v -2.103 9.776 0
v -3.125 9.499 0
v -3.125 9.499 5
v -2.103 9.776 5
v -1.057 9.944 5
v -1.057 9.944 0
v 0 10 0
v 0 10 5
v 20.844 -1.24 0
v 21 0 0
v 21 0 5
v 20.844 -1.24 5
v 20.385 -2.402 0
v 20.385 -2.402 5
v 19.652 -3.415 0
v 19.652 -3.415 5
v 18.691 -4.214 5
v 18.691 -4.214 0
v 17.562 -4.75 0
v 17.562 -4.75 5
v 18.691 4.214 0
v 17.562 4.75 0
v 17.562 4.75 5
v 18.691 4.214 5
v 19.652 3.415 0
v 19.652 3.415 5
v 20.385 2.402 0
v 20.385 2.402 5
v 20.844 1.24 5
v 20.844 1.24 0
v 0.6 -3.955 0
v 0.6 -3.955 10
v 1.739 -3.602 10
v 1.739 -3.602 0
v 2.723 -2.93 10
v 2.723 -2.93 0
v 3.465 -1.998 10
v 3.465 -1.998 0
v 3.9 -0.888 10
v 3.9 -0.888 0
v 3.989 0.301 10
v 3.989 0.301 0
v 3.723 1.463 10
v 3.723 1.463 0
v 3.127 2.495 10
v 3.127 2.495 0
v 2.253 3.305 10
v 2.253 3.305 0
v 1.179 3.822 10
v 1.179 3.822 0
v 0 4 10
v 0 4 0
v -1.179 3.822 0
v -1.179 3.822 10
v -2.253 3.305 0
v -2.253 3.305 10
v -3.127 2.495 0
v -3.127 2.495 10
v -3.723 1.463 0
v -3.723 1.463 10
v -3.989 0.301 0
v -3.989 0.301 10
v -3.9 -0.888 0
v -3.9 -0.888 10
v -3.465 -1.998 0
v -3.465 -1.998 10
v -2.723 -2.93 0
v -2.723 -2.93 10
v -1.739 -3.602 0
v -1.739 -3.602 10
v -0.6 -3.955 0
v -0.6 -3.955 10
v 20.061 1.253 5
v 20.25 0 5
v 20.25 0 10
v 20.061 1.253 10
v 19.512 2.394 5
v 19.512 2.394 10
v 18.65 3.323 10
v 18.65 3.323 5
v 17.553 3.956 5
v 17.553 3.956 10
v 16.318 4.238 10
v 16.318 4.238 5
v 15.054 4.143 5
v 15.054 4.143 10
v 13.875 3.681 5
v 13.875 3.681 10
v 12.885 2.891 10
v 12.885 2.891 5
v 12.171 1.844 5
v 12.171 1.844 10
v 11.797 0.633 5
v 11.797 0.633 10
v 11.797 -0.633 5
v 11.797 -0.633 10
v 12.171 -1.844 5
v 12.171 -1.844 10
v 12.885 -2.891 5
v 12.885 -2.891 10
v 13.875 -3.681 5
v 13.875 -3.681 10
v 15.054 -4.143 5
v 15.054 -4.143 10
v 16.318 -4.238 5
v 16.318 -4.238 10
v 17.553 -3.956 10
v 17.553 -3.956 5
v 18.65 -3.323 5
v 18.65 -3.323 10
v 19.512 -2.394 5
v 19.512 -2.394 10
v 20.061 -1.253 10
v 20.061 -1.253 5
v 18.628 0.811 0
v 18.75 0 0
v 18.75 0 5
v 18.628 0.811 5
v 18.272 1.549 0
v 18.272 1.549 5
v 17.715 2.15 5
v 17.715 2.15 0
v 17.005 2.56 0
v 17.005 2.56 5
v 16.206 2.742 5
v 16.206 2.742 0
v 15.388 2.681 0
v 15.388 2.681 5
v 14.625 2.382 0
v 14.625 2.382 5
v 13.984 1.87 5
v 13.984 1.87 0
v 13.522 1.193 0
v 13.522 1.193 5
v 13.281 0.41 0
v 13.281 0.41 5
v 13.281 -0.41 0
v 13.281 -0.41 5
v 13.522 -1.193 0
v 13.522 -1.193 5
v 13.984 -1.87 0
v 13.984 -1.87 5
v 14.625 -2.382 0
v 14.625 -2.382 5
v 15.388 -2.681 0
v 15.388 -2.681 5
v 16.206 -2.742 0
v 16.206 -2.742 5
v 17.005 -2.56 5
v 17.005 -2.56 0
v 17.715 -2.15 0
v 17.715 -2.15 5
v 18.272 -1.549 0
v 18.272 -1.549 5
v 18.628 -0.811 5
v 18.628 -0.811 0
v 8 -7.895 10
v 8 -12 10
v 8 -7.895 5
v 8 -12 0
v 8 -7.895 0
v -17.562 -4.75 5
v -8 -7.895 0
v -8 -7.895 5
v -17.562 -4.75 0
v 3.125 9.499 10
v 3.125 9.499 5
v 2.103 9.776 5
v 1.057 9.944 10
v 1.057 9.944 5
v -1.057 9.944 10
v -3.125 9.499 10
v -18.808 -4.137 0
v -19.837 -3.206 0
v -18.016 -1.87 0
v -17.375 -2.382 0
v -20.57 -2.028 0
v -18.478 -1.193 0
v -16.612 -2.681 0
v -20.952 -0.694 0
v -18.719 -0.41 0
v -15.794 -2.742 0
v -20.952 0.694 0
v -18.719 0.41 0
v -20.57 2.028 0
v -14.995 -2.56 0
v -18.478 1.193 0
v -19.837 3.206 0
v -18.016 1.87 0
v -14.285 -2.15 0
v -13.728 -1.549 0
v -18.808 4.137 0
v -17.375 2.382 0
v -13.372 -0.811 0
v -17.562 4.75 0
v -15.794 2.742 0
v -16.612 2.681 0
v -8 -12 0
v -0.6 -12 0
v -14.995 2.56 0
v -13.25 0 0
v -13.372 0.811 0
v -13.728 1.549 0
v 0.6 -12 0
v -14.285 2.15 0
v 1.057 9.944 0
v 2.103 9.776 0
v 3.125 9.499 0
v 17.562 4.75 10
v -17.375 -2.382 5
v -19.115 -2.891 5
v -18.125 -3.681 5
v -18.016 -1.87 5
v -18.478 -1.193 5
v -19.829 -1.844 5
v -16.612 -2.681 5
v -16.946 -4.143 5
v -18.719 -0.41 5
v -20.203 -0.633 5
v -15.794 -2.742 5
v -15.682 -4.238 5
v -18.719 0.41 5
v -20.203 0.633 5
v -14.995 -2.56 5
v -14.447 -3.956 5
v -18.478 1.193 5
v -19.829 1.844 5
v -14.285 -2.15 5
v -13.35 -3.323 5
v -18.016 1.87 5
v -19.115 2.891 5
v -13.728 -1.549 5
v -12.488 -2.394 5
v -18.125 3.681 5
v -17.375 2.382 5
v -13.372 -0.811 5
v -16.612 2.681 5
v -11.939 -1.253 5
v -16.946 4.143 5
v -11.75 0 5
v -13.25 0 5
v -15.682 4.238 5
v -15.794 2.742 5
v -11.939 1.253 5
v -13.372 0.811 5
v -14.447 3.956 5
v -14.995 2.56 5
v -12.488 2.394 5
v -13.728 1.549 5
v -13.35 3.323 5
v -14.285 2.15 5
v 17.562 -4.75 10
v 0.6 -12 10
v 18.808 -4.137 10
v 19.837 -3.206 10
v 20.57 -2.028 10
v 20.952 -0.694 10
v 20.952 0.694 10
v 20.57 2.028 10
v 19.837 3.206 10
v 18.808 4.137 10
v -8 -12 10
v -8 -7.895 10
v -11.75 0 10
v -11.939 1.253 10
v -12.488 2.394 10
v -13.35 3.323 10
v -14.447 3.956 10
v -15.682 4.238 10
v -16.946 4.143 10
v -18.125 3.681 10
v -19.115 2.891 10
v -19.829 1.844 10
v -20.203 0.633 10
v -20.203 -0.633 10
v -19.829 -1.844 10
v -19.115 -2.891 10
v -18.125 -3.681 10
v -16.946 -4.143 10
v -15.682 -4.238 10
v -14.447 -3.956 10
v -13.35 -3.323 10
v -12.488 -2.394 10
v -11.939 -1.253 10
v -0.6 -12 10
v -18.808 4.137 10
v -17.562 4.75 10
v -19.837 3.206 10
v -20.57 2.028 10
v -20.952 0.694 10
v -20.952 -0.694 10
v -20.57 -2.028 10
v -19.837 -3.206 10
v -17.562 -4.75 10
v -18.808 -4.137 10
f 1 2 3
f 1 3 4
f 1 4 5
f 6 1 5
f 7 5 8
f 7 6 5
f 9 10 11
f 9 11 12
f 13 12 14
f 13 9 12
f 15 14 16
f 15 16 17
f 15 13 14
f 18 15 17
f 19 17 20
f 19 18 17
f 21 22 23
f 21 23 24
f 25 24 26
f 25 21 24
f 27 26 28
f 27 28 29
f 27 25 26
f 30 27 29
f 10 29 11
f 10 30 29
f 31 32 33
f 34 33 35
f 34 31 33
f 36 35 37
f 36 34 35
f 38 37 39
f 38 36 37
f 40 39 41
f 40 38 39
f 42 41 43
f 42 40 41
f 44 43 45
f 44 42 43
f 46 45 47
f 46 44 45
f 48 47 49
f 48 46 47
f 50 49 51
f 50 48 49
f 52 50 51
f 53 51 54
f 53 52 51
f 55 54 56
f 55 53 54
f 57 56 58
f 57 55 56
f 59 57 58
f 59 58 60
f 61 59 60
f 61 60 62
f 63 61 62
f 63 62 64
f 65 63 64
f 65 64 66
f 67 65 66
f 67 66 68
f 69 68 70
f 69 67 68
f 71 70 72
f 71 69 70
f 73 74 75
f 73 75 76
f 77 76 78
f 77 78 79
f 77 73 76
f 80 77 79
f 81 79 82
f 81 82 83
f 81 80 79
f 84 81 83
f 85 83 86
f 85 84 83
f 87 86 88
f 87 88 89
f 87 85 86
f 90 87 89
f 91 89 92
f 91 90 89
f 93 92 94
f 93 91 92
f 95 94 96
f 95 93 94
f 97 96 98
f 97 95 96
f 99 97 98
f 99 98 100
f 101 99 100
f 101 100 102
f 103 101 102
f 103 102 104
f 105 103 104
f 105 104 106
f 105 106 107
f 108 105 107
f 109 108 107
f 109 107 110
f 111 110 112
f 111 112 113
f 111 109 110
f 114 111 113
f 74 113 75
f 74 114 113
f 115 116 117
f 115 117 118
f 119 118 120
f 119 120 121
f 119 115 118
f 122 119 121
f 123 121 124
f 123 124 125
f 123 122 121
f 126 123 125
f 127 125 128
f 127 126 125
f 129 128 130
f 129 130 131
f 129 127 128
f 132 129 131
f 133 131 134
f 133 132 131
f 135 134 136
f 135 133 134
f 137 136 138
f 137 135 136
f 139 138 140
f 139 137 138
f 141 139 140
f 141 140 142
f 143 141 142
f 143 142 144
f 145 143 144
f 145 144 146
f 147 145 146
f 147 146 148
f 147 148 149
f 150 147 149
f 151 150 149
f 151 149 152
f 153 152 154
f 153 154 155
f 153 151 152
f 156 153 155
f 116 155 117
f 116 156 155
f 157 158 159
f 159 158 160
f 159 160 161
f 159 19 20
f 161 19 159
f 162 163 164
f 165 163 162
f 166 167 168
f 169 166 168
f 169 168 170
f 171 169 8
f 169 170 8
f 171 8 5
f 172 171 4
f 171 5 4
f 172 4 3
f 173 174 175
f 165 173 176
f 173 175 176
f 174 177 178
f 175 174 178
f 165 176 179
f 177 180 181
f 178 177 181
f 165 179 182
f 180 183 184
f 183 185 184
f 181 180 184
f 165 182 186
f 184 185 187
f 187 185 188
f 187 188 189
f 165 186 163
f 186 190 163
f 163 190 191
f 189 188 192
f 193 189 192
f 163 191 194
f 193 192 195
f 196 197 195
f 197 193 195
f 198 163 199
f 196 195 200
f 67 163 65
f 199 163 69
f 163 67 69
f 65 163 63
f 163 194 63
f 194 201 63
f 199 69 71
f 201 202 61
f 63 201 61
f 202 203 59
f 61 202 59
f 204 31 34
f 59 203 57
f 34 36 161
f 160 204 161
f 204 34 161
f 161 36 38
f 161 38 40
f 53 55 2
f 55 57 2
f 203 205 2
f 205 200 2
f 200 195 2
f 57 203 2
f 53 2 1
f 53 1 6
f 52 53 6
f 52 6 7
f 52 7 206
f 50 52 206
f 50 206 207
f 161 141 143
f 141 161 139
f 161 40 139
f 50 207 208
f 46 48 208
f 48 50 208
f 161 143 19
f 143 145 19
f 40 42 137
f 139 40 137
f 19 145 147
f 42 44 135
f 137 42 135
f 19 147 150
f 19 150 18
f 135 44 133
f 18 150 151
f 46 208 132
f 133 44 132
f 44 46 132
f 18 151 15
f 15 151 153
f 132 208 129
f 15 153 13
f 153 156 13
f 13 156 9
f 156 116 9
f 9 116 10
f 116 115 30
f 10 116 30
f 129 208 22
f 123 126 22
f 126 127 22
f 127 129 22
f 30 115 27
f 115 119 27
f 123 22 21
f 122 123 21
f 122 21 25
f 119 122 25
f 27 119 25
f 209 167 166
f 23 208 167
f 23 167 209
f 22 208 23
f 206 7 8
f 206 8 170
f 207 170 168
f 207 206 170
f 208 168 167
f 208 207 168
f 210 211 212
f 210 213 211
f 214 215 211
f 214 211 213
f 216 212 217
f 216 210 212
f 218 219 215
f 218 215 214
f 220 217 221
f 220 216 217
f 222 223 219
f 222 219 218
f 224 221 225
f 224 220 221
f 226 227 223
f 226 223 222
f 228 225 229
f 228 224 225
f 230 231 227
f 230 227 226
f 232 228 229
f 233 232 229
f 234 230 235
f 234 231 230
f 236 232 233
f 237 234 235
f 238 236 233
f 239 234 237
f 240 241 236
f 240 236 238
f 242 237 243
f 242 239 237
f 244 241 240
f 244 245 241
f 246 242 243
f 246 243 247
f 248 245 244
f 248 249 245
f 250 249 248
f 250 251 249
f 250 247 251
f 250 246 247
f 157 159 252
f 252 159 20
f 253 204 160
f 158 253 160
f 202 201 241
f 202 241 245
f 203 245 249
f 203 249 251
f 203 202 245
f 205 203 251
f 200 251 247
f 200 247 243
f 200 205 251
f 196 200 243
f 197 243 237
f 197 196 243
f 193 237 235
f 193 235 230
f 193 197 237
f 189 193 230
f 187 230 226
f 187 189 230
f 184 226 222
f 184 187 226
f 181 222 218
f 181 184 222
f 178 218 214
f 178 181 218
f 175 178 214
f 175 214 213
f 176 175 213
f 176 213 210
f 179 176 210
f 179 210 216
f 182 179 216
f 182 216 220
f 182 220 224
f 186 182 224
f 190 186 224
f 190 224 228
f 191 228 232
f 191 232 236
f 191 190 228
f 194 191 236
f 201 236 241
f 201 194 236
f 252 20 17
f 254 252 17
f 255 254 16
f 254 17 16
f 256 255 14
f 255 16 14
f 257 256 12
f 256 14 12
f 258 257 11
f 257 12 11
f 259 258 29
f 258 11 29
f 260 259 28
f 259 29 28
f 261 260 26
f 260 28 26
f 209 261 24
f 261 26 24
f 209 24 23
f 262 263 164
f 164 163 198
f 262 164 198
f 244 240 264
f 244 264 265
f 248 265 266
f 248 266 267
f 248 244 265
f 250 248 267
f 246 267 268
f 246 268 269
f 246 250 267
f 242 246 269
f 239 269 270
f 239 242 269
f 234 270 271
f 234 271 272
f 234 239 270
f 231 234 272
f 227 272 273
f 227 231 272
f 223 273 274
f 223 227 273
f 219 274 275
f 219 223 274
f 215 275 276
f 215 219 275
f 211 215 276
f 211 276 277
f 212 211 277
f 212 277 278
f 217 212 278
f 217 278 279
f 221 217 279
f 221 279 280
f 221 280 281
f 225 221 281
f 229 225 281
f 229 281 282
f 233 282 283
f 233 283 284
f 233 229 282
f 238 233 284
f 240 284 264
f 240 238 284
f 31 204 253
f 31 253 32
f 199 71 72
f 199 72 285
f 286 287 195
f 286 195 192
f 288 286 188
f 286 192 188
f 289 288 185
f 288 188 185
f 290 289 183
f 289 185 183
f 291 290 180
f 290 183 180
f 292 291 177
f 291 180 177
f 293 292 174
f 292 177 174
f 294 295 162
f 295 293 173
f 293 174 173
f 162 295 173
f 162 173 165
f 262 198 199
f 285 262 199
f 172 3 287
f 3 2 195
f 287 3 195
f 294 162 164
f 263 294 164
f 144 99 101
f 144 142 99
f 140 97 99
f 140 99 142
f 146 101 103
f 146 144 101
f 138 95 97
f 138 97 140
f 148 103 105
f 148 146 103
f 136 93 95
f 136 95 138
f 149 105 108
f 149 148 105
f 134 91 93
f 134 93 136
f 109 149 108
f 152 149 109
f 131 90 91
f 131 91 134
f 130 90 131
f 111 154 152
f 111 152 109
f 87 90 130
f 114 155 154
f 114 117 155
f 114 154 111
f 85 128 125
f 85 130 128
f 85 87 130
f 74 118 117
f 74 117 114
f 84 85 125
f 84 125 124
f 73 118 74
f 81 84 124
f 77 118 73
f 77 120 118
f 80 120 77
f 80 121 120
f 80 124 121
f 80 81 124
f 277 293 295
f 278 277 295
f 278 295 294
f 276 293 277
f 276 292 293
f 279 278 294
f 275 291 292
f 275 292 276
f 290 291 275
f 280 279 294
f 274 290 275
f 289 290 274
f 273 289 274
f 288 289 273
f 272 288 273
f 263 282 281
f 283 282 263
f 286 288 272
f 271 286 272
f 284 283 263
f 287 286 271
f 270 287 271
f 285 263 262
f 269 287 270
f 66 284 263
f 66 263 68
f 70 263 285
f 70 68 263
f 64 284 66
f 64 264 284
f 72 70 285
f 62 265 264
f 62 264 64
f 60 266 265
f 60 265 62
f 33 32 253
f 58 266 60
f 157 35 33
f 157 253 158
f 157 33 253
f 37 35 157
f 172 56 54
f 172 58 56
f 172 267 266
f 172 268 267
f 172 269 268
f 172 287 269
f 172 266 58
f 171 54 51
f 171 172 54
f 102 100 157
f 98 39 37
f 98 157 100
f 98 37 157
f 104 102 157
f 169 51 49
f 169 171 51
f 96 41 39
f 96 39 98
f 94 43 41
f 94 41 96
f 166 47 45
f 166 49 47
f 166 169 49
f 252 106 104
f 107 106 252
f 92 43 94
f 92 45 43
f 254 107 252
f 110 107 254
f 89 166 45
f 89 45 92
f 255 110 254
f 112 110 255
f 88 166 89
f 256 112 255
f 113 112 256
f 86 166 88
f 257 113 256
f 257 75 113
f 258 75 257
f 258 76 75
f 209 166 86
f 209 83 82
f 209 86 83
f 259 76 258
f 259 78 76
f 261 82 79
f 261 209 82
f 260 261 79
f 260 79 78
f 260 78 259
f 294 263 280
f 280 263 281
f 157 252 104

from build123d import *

# Parameters (mm, degrees)
SKETCH_1_R          = 10
SKETCH_1_R_2        = 4
EXTRUDE_1_DEPTH     = 10
EXTRUDE_2_DEPTH     = 5
SKETCH_4_R          = 2.75
CUT_EXTRUDE_6_DEPTH = 5
CUT_EXTRUDE_5_DEPTH = 5
EXTRUDE_3_DEPTH     = 10
CUT_EXTRUDE_8_DEPTH = 11
SKETCH_7_R          = 4.25
EXTRUDE_4_DEPTH     = 5


with BuildPart() as part:
    # 草图1 → 凸台-拉伸1 (new body)
    with BuildSketch(Plane.XY):
        Circle(SKETCH_1_R)
        Circle(SKETCH_1_R_2, mode=Mode.SUBTRACT)
    extrude(amount=EXTRUDE_1_DEPTH)

    # 草图2 → 凸台-拉伸2 (add)
    with BuildSketch(Plane.XY):
        with BuildLine():
            Line((2.8e-08, 10), (-21.5, 10))
            Line((-21.5, 10), (-21.5, -10))
            Line((-21.5, -10), (-1.9e-08, -10))
            ThreePointArc((-1.9e-08, -10), (-10, 2.4e-08), (2.8e-08, 10))
        make_face()
        with BuildLine():
            Line((21.5, 10), (2.8e-08, 10))
            ThreePointArc((2.8e-08, 10), (7.071067822, 7.071067802), (10, 0))
            ThreePointArc((10, 0), (7.071067805, -7.071067819), (-1.9e-08, -10))
            Line((-1.9e-08, -10), (21.5, -10))
            Line((21.5, -10), (21.5, 10))
        make_face()
    extrude(amount=EXTRUDE_2_DEPTH)

    # 草图4 → 切除-拉伸6 (cut)
    with BuildSketch(Plane.XY):
        with Locations((-16, 0)):
            Circle(SKETCH_4_R)
        with Locations((16, 0)):
            Circle(SKETCH_4_R)
    extrude(amount=CUT_EXTRUDE_6_DEPTH, mode=Mode.SUBTRACT)

    # 草图3 → 切除-拉伸5 (cut)
    with BuildSketch(Plane.XY):
        with BuildLine():
            ThreePointArc((-17.5625, -4.749588798), (-21, 0), (-17.5625, 4.749588798))
            Line((-17.5625, 4.749588798), (-3.125, 9.499177596))
            ThreePointArc((-3.125, 9.499177596), (-1.582438631, 9.874000607), (0, 10))
            Line((0, 10), (-21.5, 10))
            Line((-21.5, 10), (-21.5, -10))
            Line((-21.5, -10), (0, -10))
            ThreePointArc((0, -10), (-1.582438631, -9.874000607), (-3.125, -9.499177596))
            Line((-3.125, -9.499177596), (-17.5625, -4.749588798))
        make_face()
        with BuildLine():
            Line((21.5, 10), (0, 10))
            ThreePointArc((0, 10), (1.582438631, 9.874000607), (3.125, 9.499177596))
            Line((3.125, 9.499177596), (17.5625, 4.749588798))
            ThreePointArc((17.5625, 4.749588798), (20.050462937, 2.93150985), (21, 0))
            ThreePointArc((21, 0), (20.050462937, -2.93150985), (17.5625, -4.749588798))
            Line((17.5625, -4.749588798), (3.125, -9.499177596))
            ThreePointArc((3.125, -9.499177596), (1.582438631, -9.874000607), (0, -10))
            Line((0, -10), (21.5, -10))
            Line((21.5, -10), (21.5, 10))
        make_face()
        with BuildLine():
            Line((21.5, 10), (0, 10))
            ThreePointArc((0, 10), (1.582438631, 9.874000607), (3.125, 9.499177596))
            Line((3.125, 9.499177596), (17.5625, 4.749588798))
            ThreePointArc((17.5625, 4.749588798), (20.050462937, 2.93150985), (21, 0))
            ThreePointArc((21, 0), (20.050462937, -2.93150985), (17.5625, -4.749588798))
            Line((17.5625, -4.749588798), (3.125, -9.499177596))
            ThreePointArc((3.125, -9.499177596), (1.582438631, -9.874000607), (0, -10))
            Line((0, -10), (21.5, -10))
            Line((21.5, -10), (21.5, 10))
        make_face()
        with BuildLine():
            ThreePointArc((-17.5625, -4.749588798), (-21, 0), (-17.5625, 4.749588798))
            Line((-17.5625, 4.749588798), (-3.125, 9.499177596))
            ThreePointArc((-3.125, 9.499177596), (-1.582438631, 9.874000607), (0, 10))
            Line((0, 10), (-21.5, 10))
            Line((-21.5, 10), (-21.5, -10))
            Line((-21.5, -10), (0, -10))
            ThreePointArc((0, -10), (-1.582438631, -9.874000607), (-3.125, -9.499177596))
            Line((-3.125, -9.499177596), (-17.5625, -4.749588798))
        make_face()
    extrude(amount=CUT_EXTRUDE_5_DEPTH, mode=Mode.SUBTRACT)

    # 草图5 → 凸台-拉伸3 (add)
    with BuildSketch(Plane.XY):
        with BuildLine():
            Line((-8, -6), (-8, -12))
            Line((-8, -12), (8, -12))
            Line((8, -12), (8, -6))
            ThreePointArc((8, -6), (0, -10), (-8, -6))
        make_face()
    extrude(amount=EXTRUDE_3_DEPTH)

    # 草图6 → 切除-拉伸8 (cut, through all)
    with BuildSketch(Plane.XY):
        with BuildLine():
            Line((-0.6, -12), (0.6, -12))
            Line((0.6, -12), (0.6, -3.954743987))
            ThreePointArc((0.6, -3.954743987), (0, -4), (-0.6, -3.954743987))
            Line((-0.6, -3.954743987), (-0.6, -12))
        make_face()
    extrude(amount=CUT_EXTRUDE_8_DEPTH, mode=Mode.SUBTRACT)

    # 草图7 → 凸台-拉伸4 (add)
    with BuildSketch(Plane.XY.offset(5)):
        with BuildLine():
            Line((-17.5625, -4.749588798), (-8, -7.89542034))
            Line((-8, -7.89542034), (-8, -6))
            ThreePointArc((-8, -6), (-9.539262696, 3.000411174), (-3.125, 9.499177596))
            Line((-3.125, 9.499177596), (-17.5625, 4.749588798))
            ThreePointArc((-17.5625, 4.749588798), (-21, 0), (-17.5625, -4.749588798))
        make_face()
        with Locations((-16, 0)):
            Circle(SKETCH_7_R, mode=Mode.SUBTRACT)
        with BuildLine():
            Line((8, -6), (8, -7.89542034))
            Line((8, -7.89542034), (17.5625, -4.749588798))
            ThreePointArc((17.5625, -4.749588798), (21, 0), (17.5625, 4.749588798))
            Line((17.5625, 4.749588798), (3.125, 9.499177596))
            ThreePointArc((3.125, 9.499177596), (9.539262696, 3.000411174), (8, -6))
        make_face()
        with Locations((16, 0)):
            Circle(SKETCH_7_R, mode=Mode.SUBTRACT)
    extrude(amount=EXTRUDE_4_DEPTH)


solid = part.part
